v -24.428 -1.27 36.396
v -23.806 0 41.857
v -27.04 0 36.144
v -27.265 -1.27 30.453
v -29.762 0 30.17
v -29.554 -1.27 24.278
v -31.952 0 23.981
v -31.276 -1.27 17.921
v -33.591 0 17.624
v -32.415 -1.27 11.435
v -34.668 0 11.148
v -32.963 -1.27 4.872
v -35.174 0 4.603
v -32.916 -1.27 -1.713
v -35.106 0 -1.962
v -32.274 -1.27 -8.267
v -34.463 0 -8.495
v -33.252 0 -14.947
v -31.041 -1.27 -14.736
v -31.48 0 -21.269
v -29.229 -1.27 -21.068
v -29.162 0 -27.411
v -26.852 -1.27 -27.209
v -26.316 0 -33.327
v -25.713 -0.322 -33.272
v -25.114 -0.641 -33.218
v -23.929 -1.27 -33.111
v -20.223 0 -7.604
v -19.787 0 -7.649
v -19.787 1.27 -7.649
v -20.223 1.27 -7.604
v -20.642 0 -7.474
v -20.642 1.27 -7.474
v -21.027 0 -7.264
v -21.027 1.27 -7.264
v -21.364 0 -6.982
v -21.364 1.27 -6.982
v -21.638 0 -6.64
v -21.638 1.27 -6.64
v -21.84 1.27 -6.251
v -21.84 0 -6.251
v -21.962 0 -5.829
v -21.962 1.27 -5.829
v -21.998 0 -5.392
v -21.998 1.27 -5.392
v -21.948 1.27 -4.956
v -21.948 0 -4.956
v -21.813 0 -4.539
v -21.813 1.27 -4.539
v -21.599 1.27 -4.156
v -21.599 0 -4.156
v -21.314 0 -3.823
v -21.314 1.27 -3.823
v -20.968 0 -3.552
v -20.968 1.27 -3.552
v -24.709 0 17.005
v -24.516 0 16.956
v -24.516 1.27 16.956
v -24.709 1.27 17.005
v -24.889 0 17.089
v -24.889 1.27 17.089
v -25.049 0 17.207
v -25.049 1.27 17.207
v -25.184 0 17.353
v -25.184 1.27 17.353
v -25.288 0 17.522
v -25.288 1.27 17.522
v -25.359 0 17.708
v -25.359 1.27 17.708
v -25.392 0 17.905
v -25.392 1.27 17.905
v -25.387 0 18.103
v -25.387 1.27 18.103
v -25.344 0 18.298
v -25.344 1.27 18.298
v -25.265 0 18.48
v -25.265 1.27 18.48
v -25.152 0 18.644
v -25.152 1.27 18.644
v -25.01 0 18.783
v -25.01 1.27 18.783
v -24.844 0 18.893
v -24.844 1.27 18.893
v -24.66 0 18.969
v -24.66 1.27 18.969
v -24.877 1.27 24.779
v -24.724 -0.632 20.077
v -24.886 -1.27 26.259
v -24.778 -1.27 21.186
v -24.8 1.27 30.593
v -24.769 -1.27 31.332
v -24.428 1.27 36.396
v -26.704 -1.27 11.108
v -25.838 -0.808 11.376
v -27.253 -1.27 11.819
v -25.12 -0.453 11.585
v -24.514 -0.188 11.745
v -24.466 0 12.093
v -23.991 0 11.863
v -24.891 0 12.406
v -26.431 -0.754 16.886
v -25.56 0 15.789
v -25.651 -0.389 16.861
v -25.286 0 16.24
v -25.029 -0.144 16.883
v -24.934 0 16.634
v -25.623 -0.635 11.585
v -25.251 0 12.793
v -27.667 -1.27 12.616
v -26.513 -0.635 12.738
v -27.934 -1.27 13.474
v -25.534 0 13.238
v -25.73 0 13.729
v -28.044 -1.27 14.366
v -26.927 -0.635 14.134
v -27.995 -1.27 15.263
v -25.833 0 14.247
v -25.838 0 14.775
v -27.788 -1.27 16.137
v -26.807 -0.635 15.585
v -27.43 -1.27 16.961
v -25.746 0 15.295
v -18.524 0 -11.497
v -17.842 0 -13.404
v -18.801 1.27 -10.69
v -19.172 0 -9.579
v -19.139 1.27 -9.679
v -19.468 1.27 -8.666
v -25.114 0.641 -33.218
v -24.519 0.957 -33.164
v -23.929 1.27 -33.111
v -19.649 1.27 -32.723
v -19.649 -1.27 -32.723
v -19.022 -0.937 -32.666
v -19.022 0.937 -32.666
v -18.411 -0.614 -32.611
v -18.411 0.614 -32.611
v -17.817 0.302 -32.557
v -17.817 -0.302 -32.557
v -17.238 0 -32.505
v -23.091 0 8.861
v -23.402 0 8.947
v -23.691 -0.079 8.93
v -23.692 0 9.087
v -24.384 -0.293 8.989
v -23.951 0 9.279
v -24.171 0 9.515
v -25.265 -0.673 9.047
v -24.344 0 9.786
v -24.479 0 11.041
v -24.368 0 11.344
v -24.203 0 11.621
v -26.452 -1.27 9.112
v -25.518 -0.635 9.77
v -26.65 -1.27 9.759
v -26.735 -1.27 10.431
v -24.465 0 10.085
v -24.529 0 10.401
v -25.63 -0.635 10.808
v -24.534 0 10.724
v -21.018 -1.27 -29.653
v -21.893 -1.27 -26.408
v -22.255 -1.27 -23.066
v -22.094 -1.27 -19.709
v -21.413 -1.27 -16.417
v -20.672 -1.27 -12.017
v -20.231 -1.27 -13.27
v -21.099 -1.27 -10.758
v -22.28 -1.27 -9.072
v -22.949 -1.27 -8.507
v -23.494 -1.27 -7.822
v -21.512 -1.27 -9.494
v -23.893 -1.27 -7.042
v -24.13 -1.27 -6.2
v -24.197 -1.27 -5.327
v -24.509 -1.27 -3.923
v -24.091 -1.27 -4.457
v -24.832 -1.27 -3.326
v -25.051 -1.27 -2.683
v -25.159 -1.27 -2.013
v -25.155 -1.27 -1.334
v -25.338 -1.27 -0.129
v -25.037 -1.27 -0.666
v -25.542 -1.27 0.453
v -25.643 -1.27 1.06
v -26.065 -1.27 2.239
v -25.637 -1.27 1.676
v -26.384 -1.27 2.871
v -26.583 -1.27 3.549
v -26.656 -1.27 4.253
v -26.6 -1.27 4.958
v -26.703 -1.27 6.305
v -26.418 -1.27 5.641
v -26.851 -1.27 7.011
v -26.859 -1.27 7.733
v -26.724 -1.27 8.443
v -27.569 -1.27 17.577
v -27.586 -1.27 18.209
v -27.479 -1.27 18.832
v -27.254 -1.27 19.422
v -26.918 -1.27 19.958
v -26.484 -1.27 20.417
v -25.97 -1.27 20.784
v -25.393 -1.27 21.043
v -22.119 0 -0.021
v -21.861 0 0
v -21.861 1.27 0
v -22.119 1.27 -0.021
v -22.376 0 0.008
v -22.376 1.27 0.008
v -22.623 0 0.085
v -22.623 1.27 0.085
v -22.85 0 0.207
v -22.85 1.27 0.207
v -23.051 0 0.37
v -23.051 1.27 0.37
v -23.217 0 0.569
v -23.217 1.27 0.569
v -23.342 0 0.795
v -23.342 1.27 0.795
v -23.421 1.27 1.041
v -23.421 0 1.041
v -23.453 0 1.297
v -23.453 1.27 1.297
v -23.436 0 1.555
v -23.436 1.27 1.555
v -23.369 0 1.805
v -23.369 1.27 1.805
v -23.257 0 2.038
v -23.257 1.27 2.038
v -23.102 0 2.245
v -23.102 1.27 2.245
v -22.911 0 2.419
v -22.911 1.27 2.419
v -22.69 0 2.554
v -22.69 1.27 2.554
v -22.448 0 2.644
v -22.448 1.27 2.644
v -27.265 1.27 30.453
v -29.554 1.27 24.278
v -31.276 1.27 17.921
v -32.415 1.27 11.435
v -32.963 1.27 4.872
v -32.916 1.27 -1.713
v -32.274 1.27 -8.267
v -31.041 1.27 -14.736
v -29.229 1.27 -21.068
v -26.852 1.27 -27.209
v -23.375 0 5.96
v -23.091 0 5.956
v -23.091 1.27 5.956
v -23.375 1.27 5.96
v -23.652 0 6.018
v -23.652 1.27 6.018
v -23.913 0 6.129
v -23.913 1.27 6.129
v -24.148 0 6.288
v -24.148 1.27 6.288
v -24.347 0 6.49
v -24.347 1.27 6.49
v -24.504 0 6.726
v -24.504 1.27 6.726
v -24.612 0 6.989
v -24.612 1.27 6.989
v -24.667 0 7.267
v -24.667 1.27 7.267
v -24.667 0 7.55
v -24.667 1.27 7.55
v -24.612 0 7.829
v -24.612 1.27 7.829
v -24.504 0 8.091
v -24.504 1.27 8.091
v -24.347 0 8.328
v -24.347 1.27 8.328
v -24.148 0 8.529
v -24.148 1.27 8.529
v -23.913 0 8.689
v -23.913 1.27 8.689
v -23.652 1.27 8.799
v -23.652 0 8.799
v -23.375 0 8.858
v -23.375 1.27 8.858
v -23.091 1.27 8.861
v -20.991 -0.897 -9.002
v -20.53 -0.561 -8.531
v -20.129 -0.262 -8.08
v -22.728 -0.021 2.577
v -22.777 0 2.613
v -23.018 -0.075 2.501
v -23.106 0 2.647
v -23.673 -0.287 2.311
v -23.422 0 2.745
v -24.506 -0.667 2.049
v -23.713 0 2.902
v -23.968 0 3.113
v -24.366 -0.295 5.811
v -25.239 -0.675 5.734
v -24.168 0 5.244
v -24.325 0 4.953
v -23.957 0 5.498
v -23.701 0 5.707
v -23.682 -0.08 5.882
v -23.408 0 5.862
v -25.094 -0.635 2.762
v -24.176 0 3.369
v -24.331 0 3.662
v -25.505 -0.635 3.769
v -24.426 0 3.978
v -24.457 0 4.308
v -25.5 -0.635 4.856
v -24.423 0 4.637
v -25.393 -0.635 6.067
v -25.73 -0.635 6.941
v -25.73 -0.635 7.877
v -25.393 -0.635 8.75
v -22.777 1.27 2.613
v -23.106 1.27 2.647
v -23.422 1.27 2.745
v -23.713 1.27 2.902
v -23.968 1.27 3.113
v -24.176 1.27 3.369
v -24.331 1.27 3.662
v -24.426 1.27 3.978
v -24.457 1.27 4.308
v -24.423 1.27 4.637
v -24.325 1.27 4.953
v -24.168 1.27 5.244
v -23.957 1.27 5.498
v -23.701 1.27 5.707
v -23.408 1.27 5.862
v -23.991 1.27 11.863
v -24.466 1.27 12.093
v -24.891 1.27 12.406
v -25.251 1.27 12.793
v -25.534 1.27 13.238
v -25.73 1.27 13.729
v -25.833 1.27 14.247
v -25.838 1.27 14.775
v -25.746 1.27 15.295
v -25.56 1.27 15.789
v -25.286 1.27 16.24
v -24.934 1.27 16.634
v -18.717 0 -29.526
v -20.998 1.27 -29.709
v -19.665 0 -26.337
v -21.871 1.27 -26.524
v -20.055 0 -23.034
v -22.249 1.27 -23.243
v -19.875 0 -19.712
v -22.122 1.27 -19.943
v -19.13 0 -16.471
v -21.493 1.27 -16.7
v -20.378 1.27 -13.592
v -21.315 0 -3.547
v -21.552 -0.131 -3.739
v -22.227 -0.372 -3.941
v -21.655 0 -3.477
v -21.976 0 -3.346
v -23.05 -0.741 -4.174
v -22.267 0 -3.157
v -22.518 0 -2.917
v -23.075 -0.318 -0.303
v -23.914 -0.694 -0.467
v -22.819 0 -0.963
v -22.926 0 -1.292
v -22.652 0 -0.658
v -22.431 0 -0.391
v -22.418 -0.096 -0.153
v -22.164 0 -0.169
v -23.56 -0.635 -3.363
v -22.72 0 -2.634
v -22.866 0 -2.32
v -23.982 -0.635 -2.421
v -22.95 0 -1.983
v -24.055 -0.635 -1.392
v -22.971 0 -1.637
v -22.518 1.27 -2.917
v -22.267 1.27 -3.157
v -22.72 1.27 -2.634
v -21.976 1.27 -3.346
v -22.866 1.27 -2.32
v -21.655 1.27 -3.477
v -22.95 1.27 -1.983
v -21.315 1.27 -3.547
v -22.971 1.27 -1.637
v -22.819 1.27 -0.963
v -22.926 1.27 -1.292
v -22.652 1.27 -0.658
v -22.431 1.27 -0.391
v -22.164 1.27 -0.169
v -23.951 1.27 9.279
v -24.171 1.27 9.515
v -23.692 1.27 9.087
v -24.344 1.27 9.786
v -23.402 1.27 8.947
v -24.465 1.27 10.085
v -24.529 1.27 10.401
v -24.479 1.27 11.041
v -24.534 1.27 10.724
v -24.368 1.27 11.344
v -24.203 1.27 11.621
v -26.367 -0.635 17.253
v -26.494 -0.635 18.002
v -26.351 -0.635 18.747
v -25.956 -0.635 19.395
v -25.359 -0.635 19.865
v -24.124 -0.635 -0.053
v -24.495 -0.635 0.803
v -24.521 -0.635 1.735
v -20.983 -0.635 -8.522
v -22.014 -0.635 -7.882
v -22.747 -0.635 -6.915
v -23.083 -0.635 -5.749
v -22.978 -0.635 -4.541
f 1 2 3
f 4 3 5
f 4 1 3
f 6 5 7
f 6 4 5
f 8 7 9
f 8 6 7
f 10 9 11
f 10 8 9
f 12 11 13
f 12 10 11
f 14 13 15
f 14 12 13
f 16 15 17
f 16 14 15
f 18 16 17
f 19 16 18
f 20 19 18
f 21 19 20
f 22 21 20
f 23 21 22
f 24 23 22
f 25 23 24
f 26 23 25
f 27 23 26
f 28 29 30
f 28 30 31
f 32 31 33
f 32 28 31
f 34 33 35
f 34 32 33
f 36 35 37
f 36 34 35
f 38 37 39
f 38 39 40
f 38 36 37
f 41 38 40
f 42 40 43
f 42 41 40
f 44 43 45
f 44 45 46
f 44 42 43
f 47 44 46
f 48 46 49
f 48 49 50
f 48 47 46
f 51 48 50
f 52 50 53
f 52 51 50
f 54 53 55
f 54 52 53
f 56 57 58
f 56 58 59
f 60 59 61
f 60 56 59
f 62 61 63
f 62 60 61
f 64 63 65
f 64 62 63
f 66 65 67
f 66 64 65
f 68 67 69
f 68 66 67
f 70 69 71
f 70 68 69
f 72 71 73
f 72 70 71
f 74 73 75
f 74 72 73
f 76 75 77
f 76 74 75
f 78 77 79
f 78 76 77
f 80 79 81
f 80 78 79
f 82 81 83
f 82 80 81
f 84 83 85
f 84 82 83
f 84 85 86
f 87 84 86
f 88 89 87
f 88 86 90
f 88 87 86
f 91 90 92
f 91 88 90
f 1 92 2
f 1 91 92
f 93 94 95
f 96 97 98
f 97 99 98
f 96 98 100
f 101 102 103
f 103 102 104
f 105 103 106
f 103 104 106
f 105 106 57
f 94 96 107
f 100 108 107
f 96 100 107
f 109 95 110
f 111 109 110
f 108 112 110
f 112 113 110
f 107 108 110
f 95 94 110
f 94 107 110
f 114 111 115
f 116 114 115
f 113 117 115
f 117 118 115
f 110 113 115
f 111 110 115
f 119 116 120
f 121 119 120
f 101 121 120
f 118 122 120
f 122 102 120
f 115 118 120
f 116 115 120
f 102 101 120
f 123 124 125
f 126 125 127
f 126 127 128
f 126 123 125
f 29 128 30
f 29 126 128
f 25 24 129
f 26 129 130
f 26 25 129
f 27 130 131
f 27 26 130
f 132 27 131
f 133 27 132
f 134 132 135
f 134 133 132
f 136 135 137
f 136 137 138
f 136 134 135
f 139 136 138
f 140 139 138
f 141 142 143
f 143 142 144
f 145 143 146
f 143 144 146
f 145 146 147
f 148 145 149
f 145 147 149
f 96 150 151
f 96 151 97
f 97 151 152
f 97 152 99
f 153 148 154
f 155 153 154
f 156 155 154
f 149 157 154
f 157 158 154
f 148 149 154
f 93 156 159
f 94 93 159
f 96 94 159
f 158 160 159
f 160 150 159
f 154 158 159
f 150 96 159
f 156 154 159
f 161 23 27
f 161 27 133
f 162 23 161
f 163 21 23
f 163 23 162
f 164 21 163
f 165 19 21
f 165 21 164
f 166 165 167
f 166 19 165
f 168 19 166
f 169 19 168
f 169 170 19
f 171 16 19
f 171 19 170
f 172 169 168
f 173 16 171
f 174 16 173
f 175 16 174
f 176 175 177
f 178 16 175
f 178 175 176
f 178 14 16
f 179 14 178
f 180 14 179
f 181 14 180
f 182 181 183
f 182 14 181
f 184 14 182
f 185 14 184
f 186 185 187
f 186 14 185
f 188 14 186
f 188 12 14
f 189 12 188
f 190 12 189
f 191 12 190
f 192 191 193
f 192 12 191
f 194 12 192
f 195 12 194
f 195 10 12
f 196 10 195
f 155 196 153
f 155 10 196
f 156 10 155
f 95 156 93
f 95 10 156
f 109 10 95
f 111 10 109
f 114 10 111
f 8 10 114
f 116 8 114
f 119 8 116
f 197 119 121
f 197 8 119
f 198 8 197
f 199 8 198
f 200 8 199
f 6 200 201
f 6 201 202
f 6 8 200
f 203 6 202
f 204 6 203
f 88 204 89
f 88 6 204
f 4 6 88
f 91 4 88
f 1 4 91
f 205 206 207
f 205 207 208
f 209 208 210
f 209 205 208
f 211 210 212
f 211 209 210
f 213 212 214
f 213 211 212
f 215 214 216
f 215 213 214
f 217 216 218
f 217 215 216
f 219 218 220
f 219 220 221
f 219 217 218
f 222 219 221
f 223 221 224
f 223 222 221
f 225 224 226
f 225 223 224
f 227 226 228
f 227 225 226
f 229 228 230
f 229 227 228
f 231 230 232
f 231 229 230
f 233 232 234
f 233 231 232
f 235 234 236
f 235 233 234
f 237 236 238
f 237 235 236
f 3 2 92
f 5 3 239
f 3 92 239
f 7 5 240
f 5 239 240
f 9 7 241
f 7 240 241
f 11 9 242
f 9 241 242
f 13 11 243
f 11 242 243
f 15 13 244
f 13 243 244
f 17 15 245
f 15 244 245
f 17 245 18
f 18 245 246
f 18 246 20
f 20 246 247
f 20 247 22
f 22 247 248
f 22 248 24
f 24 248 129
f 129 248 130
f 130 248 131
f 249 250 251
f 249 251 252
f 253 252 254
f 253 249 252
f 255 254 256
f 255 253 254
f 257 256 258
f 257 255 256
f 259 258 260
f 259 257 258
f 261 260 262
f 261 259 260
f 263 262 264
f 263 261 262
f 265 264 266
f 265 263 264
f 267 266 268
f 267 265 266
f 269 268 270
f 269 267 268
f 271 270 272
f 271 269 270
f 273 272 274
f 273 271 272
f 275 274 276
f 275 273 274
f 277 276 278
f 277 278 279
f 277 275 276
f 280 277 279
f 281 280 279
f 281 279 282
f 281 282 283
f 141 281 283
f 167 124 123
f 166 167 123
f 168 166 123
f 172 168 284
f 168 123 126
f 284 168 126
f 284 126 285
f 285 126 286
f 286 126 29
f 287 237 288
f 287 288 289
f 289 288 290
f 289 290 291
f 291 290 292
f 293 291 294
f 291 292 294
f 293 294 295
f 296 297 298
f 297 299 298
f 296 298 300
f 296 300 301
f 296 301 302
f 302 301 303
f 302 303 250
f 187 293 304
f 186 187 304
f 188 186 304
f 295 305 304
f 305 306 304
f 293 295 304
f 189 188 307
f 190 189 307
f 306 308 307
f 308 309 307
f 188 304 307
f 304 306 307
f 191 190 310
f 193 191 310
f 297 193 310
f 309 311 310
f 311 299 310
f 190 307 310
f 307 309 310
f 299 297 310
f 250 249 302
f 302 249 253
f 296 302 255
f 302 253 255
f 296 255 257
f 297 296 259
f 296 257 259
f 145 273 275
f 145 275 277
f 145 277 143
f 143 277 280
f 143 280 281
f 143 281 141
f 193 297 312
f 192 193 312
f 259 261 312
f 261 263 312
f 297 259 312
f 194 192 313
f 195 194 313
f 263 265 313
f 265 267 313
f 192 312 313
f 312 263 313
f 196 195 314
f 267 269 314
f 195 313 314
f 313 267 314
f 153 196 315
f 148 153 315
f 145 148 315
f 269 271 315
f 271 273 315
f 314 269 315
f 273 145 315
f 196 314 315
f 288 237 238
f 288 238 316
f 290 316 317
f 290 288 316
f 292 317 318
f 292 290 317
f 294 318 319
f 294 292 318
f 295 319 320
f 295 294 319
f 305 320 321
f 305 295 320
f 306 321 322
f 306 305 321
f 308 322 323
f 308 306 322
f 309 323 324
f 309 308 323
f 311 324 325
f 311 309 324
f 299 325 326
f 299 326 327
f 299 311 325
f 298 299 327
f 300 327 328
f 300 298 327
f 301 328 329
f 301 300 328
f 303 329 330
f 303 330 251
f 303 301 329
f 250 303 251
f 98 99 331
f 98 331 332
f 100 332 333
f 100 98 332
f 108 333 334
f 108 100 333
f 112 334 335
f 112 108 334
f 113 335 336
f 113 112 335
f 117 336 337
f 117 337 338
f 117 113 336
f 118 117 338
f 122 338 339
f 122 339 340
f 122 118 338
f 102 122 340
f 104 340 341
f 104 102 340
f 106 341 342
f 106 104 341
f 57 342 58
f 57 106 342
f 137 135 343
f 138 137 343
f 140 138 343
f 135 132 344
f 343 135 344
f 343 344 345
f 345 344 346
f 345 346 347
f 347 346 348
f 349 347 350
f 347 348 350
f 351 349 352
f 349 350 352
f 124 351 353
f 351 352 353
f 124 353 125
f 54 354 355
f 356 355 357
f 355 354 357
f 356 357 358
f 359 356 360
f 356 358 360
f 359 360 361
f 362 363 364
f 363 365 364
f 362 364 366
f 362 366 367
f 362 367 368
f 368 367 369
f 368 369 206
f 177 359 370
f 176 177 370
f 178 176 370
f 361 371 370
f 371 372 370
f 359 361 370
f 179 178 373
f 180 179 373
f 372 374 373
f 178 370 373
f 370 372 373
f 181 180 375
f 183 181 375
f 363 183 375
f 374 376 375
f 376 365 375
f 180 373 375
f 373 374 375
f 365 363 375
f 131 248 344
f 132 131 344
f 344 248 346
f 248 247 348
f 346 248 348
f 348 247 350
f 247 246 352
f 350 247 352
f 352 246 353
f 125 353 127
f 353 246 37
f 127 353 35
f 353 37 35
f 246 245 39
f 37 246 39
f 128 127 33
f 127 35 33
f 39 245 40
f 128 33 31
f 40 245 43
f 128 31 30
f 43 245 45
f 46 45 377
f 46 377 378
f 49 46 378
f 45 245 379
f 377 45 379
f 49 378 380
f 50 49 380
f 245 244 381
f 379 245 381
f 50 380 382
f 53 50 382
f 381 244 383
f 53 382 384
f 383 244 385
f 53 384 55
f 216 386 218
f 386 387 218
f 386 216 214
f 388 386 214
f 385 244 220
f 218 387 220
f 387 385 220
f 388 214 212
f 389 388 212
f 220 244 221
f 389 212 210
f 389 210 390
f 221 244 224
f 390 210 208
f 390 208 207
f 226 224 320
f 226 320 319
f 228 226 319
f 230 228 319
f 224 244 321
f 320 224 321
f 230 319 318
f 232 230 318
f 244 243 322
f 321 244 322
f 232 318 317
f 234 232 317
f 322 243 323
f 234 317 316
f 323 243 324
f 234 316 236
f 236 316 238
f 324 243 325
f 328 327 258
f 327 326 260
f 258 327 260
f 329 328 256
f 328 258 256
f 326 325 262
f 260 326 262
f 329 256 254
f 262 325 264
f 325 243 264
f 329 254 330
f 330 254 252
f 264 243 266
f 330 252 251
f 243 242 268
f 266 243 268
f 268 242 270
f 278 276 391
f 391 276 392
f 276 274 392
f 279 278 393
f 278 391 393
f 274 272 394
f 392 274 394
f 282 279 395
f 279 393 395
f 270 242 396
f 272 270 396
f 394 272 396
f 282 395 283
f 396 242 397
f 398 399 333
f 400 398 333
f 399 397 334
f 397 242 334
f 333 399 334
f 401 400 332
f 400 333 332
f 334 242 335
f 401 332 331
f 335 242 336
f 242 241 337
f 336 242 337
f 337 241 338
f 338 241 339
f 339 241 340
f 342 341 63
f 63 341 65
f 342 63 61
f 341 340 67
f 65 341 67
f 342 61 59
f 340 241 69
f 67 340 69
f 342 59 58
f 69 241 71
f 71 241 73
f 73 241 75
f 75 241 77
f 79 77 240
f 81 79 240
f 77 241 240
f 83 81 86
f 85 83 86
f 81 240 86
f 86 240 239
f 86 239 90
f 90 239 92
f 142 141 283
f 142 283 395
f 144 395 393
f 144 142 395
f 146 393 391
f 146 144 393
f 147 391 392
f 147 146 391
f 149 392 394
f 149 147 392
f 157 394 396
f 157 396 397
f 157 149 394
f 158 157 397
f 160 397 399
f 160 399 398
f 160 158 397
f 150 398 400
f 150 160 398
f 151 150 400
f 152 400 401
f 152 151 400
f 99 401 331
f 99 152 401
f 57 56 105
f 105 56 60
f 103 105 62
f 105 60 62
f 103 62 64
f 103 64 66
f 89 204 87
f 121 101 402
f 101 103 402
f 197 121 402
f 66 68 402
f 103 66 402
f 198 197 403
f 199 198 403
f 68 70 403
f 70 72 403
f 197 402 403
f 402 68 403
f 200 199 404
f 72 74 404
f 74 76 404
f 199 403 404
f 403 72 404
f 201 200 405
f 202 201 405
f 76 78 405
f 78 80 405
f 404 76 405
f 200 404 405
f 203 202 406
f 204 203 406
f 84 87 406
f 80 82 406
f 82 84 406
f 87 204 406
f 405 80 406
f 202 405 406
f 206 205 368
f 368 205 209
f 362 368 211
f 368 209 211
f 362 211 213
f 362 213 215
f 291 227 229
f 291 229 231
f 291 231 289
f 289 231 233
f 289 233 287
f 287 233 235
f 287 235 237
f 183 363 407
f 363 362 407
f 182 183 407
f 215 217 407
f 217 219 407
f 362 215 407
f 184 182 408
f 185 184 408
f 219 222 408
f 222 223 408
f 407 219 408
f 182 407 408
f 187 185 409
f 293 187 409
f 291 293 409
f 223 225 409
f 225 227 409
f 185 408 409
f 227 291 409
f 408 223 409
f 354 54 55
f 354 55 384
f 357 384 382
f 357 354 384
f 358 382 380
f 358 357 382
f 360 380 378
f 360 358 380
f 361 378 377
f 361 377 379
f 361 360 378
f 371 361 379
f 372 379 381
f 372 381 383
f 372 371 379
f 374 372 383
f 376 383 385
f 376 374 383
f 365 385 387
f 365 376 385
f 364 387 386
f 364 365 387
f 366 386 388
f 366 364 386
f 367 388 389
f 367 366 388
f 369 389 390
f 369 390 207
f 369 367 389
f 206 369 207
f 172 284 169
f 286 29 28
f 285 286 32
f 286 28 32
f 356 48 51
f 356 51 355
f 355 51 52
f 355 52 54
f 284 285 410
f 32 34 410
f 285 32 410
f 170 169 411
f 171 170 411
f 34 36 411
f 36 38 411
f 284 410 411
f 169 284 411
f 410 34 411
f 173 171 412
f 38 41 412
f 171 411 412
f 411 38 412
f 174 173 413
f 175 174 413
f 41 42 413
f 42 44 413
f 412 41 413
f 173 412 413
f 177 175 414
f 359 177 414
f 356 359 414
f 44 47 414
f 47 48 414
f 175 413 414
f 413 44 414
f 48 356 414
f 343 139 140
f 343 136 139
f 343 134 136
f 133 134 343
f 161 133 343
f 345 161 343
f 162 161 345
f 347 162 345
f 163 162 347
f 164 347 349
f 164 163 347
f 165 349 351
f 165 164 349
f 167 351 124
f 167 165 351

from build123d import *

# Parameters (mm, degrees)
F1_DEPTH    = 1.27
F2_T2_ANGLE = 70.6982594797
F2_T4_ANGLE = 98.1015766654
F2_T6_ANGLE = 98.1015766654
F2_T8_ANGLE = 70.6982594797
F3_SIZE2    = 1.26999
F3_SIZE     = 2.199695


# Not quite as in the source:
# - a fillet or chamfer that OpenCascade refuses, or shapes differently, is made with other operations: its cross-section is extruded or revolved along the edge and cut away or added
# - a fillet or chamfer is up to 0.001 mm smaller than in the source, because OpenCascade refuses the exact size


with BuildPart() as f1:
    # F0 (on Front) → F1 (new body, symmetric)
    with BuildSketch(Plane.XZ):
        with BuildLine():
            ThreePointArc((-24.6599751414, 18.9685343092), (-24.7897166458, 30.8482925644), (-23.6891379404, 42.6776719046))
            ThreePointArc((-23.6891379404, 42.6776719046), (-35.4977812157, 5.0650277845), (-26.6841664691, -33.3599022584))
            Line((-26.6841664691, -33.3599022584), (-16.8598182499, -32.4707999825))
            ThreePointArc((-16.8598182499, -32.4707999825), (-19.7060260634, -23.2610213965), (-17.6819246262, -13.836376369))
            ThreePointArc((-17.6819246262, -13.836376369), (-18.7784432725, -10.7577001108), (-19.7867489636, -7.6490154569))
            ThreePointArc((-19.7867489636, -7.6490154569), (-21.9116415788, -6.0429526618), (-20.9683603212, -3.5520036866))
            ThreePointArc((-20.9683603212, -3.5520036866), (-22.9156863653, -2.1532182096), (-21.8610153861, 0))
            ThreePointArc((-21.8610153861, 0), (-23.4214756824, 1.0408615122), (-22.4479204638, 2.6441765967))
            ThreePointArc((-22.4479204638, 2.6441765967), (-24.4256582154, 3.9784606628), (-23.0913741493, 5.9561984144))
            ThreePointArc((-23.0913741493, 5.9561984144), (-24.6734313076, 7.4086637933), (-23.0913741493, 8.8611291721))
            ThreePointArc((-23.0913741493, 8.8611291721), (-24.4648932463, 10.085402282), (-23.9908037994, 11.8632207636))
            ThreePointArc((-23.9908037994, 11.8632207636), (-25.8325317785, 14.2467515683), (-24.515682055, 16.9558266598))
            ThreePointArc((-24.515682055, 16.9558266598), (-25.3917786695, 17.9045444751), (-24.6599751414, 18.9685343092))
        make_face()
    extrude(amount=F1_DEPTH, both=True)

    # F2: chamfer of 2.54 x 1.4664696837 on 4 edges, made by hand

    # F2_s1 → F2_t2 (revolve, cut)
    with BuildSketch(Plane(origin=(15.8164222993, 0, 20.5345022431), x_dir=(0, 1, 0), z_dir=(0.6102111975, 0, 0.7922387862))):
        Polygon((0.1964696837, 45.0964764528), (-1.27, 42.5564764528), (-1.27, 45.0964764528), align=None)
    revolve(axis=Axis((39.7484673267, -1.27, 2.1011686196), (0, -1, 0)), revolution_arc=F2_T2_ANGLE, mode=Mode.SUBTRACT)

    # F2_s3 → F2_t4 (revolve, cut)
    with BuildSketch(Plane(origin=(10.5087646573, 0, -8.3360437766), x_dir=(0, 1, 0), z_dir=(0.7834430035, 0, -0.6214636436))):
        Polygon((0.1964696837, -37.0387129854), (-1.27, -39.5787129854), (-1.27, -37.0387129854), align=None)
    revolve(axis=Axis((-0.664029112, -1.27, -22.4209338555), (0, 1, 0)), revolution_arc=F2_T4_ANGLE, mode=Mode.SUBTRACT)

    # F2_s5 → F2_t6 (revolve, cut)
    with BuildSketch(Plane(origin=(10.5087646573, 0, -8.3360437766), x_dir=(0, 1, 0), z_dir=(0.7834430035, 0, -0.6214636436))):
        Polygon((-0.1964696837, -37.0387129854), (1.27, -39.5787129854), (1.27, -37.0387129854), align=None)
    revolve(axis=Axis((-0.664029112, 1.27, -22.4209338555), (0, 1, 0)), revolution_arc=F2_T6_ANGLE, mode=Mode.SUBTRACT)

    # F2_s7 → F2_t8 (revolve, cut)
    with BuildSketch(Plane(origin=(15.8164222993, 0, 20.5345022431), x_dir=(0, 1, 0), z_dir=(0.6102111975, 0, 0.7922387862))):
        Polygon((-0.1964696837, 45.0964764528), (1.27, 42.5564764528), (1.27, 45.0964764528), align=None)
    revolve(axis=Axis((39.7484673267, 1.27, 2.1011686196), (0, -1, 0)), revolution_arc=F2_T8_ANGLE, mode=Mode.SUBTRACT)

    # F3 (size 2.1997045256 and 1.27 in the source; OpenCascade refuses exactly that, so slightly less here)
    f3_edges = [f1.edges().sort_by_distance(p)[0] for p in [
        (-25.391779, -1.27, 17.904544),
        (-25.832532, -1.27, 14.246752),
        (-24.464893, -1.27, 10.085402),
        (-24.673431, -1.27, 7.408664),
        (-24.425658, -1.27, 3.978461),
        (-23.421476, -1.27, 1.040862),
        (-22.915686, -1.27, -2.153218),
        (-21.911642, -1.27, -6.042953),
        (-19.304708, -1.27, -9.17292),
    ]]
    f3_side = f1.faces().sort_by_distance((-26.820245, -1.27, -2.285194))[0]
    chamfer(f3_edges, length=F3_SIZE, length2=F3_SIZE2, reference=f3_side)


solid = f1.part
